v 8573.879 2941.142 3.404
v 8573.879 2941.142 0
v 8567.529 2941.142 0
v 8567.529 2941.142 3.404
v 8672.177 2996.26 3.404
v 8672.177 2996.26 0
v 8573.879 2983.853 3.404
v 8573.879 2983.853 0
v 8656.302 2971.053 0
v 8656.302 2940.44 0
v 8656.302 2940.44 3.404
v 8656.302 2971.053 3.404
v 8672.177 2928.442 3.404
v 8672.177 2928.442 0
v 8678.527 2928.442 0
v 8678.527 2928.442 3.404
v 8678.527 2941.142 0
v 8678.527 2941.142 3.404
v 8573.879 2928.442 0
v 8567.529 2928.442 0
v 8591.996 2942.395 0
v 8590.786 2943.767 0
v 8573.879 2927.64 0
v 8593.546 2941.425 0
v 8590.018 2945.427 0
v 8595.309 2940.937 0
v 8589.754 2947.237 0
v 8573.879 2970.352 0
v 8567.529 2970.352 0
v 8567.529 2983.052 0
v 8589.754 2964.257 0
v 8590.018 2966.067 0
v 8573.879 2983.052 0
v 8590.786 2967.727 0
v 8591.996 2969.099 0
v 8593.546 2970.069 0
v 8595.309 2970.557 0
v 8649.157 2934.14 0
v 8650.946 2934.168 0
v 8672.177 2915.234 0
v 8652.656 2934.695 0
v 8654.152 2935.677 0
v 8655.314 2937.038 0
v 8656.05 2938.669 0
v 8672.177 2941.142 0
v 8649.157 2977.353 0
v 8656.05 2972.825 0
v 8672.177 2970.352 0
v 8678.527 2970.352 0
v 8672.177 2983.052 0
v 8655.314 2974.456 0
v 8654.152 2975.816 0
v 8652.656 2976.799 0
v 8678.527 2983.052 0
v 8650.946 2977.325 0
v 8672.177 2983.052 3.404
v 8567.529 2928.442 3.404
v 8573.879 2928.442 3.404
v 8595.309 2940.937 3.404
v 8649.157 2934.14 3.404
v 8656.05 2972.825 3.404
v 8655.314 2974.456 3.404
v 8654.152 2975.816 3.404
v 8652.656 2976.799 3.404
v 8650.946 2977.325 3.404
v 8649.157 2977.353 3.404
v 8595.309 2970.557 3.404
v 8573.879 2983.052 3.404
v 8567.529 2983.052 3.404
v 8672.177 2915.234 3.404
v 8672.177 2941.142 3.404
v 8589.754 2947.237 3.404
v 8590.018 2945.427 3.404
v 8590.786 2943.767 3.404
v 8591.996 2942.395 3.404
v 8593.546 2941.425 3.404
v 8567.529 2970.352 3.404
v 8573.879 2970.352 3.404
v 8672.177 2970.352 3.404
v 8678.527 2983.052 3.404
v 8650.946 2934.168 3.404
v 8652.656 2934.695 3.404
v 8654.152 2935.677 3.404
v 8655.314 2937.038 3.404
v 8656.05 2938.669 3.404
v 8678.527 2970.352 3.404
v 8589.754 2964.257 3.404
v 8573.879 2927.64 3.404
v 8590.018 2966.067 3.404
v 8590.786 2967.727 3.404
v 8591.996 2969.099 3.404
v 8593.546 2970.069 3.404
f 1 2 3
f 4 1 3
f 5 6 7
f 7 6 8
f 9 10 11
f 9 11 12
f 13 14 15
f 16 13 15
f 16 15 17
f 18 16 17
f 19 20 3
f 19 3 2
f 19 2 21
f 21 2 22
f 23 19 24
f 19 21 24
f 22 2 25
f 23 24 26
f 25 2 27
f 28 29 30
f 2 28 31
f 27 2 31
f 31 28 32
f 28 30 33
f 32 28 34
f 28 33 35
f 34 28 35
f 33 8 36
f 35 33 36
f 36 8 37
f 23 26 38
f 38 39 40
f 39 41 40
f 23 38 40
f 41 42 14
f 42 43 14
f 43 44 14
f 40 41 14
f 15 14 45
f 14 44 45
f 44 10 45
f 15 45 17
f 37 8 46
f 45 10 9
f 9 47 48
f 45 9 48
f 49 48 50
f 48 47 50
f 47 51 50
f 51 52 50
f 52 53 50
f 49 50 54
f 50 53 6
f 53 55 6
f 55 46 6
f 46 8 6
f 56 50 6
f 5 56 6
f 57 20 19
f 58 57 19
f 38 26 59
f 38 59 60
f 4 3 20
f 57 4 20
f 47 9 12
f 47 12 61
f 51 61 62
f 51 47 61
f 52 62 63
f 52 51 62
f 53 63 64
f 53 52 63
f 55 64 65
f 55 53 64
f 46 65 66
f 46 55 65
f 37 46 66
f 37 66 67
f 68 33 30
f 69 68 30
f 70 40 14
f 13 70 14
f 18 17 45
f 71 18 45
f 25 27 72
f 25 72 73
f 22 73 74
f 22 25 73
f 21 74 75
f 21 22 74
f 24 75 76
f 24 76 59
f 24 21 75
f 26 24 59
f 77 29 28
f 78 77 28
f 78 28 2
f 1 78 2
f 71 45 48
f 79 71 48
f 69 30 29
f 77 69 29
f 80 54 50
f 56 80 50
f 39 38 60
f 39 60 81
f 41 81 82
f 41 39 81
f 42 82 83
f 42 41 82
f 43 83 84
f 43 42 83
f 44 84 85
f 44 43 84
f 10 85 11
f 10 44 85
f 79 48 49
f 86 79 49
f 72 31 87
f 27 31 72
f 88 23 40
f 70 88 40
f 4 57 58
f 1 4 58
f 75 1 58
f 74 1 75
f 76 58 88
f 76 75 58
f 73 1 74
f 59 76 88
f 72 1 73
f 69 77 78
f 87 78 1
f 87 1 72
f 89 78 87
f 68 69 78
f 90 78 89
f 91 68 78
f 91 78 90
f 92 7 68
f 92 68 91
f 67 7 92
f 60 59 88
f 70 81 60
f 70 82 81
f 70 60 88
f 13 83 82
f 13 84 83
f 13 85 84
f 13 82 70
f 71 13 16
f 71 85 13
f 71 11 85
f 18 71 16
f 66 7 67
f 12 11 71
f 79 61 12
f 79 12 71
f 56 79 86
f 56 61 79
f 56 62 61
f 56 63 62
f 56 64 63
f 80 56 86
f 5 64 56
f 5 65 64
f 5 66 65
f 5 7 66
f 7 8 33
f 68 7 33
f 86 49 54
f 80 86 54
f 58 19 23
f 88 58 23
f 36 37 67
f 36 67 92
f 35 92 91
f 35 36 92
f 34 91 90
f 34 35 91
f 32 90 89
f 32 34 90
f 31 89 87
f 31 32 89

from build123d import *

# Parameters (mm, degrees)
BOSS_EXTRUDE1_DEPTH = 3.4036


with BuildPart() as part:
    # Sketch1 → Boss-Extrude1 (new body)
    with BuildSketch(Plane.XY):
        Polygon((8672.177263948, 2928.441804612), (8678.527263948, 2928.441804612), (8678.527263948, 2941.141804612), (8672.177263948, 2941.141804612), (8672.177263948, 2970.351804612), (8678.527263948, 2970.351804612), (8678.527263948, 2983.051804612), (8672.177263948, 2983.051804612), (8672.177263948, 2996.259804612), (8573.879263948, 2983.853260922), (8573.879263948, 2983.051804612), (8567.529263948, 2983.051804612), (8567.529263948, 2970.351804612), (8573.879263948, 2970.351804612), (8573.879263948, 2941.141804612), (8567.529263948, 2941.141804612), (8567.529263948, 2928.441804612), (8573.879263948, 2928.441804612), (8573.879263948, 2927.640348301), (8672.177263948, 2915.233804612), align=None)
        with BuildLine():
            Line((8589.754263948, 2964.257036739), (8589.754263948, 2947.236572484))
            ThreePointArc((8589.754263948, 2947.236572484), (8591.34129796, 2943.036970717), (8595.309115917, 2940.936553468))
            Line((8595.309115917, 2940.936553468), (8649.157115917, 2934.140203953))
            ThreePointArc((8649.157115917, 2934.140203953), (8654.151865715, 2935.677256982), (8656.302263948, 2940.44022297))
            Line((8656.302263948, 2940.44022297), (8656.302263948, 2971.053386254))
            ThreePointArc((8656.302263948, 2971.053386254), (8654.151865715, 2975.816352241), (8649.157115917, 2977.35340527))
            Line((8649.157115917, 2977.35340527), (8595.309115917, 2970.557055756))
            ThreePointArc((8595.309115917, 2970.557055756), (8591.34129796, 2968.456638506), (8589.754263948, 2964.257036739))
        make_face(mode=Mode.SUBTRACT)
    extrude(amount=BOSS_EXTRUDE1_DEPTH)


solid = part.part
